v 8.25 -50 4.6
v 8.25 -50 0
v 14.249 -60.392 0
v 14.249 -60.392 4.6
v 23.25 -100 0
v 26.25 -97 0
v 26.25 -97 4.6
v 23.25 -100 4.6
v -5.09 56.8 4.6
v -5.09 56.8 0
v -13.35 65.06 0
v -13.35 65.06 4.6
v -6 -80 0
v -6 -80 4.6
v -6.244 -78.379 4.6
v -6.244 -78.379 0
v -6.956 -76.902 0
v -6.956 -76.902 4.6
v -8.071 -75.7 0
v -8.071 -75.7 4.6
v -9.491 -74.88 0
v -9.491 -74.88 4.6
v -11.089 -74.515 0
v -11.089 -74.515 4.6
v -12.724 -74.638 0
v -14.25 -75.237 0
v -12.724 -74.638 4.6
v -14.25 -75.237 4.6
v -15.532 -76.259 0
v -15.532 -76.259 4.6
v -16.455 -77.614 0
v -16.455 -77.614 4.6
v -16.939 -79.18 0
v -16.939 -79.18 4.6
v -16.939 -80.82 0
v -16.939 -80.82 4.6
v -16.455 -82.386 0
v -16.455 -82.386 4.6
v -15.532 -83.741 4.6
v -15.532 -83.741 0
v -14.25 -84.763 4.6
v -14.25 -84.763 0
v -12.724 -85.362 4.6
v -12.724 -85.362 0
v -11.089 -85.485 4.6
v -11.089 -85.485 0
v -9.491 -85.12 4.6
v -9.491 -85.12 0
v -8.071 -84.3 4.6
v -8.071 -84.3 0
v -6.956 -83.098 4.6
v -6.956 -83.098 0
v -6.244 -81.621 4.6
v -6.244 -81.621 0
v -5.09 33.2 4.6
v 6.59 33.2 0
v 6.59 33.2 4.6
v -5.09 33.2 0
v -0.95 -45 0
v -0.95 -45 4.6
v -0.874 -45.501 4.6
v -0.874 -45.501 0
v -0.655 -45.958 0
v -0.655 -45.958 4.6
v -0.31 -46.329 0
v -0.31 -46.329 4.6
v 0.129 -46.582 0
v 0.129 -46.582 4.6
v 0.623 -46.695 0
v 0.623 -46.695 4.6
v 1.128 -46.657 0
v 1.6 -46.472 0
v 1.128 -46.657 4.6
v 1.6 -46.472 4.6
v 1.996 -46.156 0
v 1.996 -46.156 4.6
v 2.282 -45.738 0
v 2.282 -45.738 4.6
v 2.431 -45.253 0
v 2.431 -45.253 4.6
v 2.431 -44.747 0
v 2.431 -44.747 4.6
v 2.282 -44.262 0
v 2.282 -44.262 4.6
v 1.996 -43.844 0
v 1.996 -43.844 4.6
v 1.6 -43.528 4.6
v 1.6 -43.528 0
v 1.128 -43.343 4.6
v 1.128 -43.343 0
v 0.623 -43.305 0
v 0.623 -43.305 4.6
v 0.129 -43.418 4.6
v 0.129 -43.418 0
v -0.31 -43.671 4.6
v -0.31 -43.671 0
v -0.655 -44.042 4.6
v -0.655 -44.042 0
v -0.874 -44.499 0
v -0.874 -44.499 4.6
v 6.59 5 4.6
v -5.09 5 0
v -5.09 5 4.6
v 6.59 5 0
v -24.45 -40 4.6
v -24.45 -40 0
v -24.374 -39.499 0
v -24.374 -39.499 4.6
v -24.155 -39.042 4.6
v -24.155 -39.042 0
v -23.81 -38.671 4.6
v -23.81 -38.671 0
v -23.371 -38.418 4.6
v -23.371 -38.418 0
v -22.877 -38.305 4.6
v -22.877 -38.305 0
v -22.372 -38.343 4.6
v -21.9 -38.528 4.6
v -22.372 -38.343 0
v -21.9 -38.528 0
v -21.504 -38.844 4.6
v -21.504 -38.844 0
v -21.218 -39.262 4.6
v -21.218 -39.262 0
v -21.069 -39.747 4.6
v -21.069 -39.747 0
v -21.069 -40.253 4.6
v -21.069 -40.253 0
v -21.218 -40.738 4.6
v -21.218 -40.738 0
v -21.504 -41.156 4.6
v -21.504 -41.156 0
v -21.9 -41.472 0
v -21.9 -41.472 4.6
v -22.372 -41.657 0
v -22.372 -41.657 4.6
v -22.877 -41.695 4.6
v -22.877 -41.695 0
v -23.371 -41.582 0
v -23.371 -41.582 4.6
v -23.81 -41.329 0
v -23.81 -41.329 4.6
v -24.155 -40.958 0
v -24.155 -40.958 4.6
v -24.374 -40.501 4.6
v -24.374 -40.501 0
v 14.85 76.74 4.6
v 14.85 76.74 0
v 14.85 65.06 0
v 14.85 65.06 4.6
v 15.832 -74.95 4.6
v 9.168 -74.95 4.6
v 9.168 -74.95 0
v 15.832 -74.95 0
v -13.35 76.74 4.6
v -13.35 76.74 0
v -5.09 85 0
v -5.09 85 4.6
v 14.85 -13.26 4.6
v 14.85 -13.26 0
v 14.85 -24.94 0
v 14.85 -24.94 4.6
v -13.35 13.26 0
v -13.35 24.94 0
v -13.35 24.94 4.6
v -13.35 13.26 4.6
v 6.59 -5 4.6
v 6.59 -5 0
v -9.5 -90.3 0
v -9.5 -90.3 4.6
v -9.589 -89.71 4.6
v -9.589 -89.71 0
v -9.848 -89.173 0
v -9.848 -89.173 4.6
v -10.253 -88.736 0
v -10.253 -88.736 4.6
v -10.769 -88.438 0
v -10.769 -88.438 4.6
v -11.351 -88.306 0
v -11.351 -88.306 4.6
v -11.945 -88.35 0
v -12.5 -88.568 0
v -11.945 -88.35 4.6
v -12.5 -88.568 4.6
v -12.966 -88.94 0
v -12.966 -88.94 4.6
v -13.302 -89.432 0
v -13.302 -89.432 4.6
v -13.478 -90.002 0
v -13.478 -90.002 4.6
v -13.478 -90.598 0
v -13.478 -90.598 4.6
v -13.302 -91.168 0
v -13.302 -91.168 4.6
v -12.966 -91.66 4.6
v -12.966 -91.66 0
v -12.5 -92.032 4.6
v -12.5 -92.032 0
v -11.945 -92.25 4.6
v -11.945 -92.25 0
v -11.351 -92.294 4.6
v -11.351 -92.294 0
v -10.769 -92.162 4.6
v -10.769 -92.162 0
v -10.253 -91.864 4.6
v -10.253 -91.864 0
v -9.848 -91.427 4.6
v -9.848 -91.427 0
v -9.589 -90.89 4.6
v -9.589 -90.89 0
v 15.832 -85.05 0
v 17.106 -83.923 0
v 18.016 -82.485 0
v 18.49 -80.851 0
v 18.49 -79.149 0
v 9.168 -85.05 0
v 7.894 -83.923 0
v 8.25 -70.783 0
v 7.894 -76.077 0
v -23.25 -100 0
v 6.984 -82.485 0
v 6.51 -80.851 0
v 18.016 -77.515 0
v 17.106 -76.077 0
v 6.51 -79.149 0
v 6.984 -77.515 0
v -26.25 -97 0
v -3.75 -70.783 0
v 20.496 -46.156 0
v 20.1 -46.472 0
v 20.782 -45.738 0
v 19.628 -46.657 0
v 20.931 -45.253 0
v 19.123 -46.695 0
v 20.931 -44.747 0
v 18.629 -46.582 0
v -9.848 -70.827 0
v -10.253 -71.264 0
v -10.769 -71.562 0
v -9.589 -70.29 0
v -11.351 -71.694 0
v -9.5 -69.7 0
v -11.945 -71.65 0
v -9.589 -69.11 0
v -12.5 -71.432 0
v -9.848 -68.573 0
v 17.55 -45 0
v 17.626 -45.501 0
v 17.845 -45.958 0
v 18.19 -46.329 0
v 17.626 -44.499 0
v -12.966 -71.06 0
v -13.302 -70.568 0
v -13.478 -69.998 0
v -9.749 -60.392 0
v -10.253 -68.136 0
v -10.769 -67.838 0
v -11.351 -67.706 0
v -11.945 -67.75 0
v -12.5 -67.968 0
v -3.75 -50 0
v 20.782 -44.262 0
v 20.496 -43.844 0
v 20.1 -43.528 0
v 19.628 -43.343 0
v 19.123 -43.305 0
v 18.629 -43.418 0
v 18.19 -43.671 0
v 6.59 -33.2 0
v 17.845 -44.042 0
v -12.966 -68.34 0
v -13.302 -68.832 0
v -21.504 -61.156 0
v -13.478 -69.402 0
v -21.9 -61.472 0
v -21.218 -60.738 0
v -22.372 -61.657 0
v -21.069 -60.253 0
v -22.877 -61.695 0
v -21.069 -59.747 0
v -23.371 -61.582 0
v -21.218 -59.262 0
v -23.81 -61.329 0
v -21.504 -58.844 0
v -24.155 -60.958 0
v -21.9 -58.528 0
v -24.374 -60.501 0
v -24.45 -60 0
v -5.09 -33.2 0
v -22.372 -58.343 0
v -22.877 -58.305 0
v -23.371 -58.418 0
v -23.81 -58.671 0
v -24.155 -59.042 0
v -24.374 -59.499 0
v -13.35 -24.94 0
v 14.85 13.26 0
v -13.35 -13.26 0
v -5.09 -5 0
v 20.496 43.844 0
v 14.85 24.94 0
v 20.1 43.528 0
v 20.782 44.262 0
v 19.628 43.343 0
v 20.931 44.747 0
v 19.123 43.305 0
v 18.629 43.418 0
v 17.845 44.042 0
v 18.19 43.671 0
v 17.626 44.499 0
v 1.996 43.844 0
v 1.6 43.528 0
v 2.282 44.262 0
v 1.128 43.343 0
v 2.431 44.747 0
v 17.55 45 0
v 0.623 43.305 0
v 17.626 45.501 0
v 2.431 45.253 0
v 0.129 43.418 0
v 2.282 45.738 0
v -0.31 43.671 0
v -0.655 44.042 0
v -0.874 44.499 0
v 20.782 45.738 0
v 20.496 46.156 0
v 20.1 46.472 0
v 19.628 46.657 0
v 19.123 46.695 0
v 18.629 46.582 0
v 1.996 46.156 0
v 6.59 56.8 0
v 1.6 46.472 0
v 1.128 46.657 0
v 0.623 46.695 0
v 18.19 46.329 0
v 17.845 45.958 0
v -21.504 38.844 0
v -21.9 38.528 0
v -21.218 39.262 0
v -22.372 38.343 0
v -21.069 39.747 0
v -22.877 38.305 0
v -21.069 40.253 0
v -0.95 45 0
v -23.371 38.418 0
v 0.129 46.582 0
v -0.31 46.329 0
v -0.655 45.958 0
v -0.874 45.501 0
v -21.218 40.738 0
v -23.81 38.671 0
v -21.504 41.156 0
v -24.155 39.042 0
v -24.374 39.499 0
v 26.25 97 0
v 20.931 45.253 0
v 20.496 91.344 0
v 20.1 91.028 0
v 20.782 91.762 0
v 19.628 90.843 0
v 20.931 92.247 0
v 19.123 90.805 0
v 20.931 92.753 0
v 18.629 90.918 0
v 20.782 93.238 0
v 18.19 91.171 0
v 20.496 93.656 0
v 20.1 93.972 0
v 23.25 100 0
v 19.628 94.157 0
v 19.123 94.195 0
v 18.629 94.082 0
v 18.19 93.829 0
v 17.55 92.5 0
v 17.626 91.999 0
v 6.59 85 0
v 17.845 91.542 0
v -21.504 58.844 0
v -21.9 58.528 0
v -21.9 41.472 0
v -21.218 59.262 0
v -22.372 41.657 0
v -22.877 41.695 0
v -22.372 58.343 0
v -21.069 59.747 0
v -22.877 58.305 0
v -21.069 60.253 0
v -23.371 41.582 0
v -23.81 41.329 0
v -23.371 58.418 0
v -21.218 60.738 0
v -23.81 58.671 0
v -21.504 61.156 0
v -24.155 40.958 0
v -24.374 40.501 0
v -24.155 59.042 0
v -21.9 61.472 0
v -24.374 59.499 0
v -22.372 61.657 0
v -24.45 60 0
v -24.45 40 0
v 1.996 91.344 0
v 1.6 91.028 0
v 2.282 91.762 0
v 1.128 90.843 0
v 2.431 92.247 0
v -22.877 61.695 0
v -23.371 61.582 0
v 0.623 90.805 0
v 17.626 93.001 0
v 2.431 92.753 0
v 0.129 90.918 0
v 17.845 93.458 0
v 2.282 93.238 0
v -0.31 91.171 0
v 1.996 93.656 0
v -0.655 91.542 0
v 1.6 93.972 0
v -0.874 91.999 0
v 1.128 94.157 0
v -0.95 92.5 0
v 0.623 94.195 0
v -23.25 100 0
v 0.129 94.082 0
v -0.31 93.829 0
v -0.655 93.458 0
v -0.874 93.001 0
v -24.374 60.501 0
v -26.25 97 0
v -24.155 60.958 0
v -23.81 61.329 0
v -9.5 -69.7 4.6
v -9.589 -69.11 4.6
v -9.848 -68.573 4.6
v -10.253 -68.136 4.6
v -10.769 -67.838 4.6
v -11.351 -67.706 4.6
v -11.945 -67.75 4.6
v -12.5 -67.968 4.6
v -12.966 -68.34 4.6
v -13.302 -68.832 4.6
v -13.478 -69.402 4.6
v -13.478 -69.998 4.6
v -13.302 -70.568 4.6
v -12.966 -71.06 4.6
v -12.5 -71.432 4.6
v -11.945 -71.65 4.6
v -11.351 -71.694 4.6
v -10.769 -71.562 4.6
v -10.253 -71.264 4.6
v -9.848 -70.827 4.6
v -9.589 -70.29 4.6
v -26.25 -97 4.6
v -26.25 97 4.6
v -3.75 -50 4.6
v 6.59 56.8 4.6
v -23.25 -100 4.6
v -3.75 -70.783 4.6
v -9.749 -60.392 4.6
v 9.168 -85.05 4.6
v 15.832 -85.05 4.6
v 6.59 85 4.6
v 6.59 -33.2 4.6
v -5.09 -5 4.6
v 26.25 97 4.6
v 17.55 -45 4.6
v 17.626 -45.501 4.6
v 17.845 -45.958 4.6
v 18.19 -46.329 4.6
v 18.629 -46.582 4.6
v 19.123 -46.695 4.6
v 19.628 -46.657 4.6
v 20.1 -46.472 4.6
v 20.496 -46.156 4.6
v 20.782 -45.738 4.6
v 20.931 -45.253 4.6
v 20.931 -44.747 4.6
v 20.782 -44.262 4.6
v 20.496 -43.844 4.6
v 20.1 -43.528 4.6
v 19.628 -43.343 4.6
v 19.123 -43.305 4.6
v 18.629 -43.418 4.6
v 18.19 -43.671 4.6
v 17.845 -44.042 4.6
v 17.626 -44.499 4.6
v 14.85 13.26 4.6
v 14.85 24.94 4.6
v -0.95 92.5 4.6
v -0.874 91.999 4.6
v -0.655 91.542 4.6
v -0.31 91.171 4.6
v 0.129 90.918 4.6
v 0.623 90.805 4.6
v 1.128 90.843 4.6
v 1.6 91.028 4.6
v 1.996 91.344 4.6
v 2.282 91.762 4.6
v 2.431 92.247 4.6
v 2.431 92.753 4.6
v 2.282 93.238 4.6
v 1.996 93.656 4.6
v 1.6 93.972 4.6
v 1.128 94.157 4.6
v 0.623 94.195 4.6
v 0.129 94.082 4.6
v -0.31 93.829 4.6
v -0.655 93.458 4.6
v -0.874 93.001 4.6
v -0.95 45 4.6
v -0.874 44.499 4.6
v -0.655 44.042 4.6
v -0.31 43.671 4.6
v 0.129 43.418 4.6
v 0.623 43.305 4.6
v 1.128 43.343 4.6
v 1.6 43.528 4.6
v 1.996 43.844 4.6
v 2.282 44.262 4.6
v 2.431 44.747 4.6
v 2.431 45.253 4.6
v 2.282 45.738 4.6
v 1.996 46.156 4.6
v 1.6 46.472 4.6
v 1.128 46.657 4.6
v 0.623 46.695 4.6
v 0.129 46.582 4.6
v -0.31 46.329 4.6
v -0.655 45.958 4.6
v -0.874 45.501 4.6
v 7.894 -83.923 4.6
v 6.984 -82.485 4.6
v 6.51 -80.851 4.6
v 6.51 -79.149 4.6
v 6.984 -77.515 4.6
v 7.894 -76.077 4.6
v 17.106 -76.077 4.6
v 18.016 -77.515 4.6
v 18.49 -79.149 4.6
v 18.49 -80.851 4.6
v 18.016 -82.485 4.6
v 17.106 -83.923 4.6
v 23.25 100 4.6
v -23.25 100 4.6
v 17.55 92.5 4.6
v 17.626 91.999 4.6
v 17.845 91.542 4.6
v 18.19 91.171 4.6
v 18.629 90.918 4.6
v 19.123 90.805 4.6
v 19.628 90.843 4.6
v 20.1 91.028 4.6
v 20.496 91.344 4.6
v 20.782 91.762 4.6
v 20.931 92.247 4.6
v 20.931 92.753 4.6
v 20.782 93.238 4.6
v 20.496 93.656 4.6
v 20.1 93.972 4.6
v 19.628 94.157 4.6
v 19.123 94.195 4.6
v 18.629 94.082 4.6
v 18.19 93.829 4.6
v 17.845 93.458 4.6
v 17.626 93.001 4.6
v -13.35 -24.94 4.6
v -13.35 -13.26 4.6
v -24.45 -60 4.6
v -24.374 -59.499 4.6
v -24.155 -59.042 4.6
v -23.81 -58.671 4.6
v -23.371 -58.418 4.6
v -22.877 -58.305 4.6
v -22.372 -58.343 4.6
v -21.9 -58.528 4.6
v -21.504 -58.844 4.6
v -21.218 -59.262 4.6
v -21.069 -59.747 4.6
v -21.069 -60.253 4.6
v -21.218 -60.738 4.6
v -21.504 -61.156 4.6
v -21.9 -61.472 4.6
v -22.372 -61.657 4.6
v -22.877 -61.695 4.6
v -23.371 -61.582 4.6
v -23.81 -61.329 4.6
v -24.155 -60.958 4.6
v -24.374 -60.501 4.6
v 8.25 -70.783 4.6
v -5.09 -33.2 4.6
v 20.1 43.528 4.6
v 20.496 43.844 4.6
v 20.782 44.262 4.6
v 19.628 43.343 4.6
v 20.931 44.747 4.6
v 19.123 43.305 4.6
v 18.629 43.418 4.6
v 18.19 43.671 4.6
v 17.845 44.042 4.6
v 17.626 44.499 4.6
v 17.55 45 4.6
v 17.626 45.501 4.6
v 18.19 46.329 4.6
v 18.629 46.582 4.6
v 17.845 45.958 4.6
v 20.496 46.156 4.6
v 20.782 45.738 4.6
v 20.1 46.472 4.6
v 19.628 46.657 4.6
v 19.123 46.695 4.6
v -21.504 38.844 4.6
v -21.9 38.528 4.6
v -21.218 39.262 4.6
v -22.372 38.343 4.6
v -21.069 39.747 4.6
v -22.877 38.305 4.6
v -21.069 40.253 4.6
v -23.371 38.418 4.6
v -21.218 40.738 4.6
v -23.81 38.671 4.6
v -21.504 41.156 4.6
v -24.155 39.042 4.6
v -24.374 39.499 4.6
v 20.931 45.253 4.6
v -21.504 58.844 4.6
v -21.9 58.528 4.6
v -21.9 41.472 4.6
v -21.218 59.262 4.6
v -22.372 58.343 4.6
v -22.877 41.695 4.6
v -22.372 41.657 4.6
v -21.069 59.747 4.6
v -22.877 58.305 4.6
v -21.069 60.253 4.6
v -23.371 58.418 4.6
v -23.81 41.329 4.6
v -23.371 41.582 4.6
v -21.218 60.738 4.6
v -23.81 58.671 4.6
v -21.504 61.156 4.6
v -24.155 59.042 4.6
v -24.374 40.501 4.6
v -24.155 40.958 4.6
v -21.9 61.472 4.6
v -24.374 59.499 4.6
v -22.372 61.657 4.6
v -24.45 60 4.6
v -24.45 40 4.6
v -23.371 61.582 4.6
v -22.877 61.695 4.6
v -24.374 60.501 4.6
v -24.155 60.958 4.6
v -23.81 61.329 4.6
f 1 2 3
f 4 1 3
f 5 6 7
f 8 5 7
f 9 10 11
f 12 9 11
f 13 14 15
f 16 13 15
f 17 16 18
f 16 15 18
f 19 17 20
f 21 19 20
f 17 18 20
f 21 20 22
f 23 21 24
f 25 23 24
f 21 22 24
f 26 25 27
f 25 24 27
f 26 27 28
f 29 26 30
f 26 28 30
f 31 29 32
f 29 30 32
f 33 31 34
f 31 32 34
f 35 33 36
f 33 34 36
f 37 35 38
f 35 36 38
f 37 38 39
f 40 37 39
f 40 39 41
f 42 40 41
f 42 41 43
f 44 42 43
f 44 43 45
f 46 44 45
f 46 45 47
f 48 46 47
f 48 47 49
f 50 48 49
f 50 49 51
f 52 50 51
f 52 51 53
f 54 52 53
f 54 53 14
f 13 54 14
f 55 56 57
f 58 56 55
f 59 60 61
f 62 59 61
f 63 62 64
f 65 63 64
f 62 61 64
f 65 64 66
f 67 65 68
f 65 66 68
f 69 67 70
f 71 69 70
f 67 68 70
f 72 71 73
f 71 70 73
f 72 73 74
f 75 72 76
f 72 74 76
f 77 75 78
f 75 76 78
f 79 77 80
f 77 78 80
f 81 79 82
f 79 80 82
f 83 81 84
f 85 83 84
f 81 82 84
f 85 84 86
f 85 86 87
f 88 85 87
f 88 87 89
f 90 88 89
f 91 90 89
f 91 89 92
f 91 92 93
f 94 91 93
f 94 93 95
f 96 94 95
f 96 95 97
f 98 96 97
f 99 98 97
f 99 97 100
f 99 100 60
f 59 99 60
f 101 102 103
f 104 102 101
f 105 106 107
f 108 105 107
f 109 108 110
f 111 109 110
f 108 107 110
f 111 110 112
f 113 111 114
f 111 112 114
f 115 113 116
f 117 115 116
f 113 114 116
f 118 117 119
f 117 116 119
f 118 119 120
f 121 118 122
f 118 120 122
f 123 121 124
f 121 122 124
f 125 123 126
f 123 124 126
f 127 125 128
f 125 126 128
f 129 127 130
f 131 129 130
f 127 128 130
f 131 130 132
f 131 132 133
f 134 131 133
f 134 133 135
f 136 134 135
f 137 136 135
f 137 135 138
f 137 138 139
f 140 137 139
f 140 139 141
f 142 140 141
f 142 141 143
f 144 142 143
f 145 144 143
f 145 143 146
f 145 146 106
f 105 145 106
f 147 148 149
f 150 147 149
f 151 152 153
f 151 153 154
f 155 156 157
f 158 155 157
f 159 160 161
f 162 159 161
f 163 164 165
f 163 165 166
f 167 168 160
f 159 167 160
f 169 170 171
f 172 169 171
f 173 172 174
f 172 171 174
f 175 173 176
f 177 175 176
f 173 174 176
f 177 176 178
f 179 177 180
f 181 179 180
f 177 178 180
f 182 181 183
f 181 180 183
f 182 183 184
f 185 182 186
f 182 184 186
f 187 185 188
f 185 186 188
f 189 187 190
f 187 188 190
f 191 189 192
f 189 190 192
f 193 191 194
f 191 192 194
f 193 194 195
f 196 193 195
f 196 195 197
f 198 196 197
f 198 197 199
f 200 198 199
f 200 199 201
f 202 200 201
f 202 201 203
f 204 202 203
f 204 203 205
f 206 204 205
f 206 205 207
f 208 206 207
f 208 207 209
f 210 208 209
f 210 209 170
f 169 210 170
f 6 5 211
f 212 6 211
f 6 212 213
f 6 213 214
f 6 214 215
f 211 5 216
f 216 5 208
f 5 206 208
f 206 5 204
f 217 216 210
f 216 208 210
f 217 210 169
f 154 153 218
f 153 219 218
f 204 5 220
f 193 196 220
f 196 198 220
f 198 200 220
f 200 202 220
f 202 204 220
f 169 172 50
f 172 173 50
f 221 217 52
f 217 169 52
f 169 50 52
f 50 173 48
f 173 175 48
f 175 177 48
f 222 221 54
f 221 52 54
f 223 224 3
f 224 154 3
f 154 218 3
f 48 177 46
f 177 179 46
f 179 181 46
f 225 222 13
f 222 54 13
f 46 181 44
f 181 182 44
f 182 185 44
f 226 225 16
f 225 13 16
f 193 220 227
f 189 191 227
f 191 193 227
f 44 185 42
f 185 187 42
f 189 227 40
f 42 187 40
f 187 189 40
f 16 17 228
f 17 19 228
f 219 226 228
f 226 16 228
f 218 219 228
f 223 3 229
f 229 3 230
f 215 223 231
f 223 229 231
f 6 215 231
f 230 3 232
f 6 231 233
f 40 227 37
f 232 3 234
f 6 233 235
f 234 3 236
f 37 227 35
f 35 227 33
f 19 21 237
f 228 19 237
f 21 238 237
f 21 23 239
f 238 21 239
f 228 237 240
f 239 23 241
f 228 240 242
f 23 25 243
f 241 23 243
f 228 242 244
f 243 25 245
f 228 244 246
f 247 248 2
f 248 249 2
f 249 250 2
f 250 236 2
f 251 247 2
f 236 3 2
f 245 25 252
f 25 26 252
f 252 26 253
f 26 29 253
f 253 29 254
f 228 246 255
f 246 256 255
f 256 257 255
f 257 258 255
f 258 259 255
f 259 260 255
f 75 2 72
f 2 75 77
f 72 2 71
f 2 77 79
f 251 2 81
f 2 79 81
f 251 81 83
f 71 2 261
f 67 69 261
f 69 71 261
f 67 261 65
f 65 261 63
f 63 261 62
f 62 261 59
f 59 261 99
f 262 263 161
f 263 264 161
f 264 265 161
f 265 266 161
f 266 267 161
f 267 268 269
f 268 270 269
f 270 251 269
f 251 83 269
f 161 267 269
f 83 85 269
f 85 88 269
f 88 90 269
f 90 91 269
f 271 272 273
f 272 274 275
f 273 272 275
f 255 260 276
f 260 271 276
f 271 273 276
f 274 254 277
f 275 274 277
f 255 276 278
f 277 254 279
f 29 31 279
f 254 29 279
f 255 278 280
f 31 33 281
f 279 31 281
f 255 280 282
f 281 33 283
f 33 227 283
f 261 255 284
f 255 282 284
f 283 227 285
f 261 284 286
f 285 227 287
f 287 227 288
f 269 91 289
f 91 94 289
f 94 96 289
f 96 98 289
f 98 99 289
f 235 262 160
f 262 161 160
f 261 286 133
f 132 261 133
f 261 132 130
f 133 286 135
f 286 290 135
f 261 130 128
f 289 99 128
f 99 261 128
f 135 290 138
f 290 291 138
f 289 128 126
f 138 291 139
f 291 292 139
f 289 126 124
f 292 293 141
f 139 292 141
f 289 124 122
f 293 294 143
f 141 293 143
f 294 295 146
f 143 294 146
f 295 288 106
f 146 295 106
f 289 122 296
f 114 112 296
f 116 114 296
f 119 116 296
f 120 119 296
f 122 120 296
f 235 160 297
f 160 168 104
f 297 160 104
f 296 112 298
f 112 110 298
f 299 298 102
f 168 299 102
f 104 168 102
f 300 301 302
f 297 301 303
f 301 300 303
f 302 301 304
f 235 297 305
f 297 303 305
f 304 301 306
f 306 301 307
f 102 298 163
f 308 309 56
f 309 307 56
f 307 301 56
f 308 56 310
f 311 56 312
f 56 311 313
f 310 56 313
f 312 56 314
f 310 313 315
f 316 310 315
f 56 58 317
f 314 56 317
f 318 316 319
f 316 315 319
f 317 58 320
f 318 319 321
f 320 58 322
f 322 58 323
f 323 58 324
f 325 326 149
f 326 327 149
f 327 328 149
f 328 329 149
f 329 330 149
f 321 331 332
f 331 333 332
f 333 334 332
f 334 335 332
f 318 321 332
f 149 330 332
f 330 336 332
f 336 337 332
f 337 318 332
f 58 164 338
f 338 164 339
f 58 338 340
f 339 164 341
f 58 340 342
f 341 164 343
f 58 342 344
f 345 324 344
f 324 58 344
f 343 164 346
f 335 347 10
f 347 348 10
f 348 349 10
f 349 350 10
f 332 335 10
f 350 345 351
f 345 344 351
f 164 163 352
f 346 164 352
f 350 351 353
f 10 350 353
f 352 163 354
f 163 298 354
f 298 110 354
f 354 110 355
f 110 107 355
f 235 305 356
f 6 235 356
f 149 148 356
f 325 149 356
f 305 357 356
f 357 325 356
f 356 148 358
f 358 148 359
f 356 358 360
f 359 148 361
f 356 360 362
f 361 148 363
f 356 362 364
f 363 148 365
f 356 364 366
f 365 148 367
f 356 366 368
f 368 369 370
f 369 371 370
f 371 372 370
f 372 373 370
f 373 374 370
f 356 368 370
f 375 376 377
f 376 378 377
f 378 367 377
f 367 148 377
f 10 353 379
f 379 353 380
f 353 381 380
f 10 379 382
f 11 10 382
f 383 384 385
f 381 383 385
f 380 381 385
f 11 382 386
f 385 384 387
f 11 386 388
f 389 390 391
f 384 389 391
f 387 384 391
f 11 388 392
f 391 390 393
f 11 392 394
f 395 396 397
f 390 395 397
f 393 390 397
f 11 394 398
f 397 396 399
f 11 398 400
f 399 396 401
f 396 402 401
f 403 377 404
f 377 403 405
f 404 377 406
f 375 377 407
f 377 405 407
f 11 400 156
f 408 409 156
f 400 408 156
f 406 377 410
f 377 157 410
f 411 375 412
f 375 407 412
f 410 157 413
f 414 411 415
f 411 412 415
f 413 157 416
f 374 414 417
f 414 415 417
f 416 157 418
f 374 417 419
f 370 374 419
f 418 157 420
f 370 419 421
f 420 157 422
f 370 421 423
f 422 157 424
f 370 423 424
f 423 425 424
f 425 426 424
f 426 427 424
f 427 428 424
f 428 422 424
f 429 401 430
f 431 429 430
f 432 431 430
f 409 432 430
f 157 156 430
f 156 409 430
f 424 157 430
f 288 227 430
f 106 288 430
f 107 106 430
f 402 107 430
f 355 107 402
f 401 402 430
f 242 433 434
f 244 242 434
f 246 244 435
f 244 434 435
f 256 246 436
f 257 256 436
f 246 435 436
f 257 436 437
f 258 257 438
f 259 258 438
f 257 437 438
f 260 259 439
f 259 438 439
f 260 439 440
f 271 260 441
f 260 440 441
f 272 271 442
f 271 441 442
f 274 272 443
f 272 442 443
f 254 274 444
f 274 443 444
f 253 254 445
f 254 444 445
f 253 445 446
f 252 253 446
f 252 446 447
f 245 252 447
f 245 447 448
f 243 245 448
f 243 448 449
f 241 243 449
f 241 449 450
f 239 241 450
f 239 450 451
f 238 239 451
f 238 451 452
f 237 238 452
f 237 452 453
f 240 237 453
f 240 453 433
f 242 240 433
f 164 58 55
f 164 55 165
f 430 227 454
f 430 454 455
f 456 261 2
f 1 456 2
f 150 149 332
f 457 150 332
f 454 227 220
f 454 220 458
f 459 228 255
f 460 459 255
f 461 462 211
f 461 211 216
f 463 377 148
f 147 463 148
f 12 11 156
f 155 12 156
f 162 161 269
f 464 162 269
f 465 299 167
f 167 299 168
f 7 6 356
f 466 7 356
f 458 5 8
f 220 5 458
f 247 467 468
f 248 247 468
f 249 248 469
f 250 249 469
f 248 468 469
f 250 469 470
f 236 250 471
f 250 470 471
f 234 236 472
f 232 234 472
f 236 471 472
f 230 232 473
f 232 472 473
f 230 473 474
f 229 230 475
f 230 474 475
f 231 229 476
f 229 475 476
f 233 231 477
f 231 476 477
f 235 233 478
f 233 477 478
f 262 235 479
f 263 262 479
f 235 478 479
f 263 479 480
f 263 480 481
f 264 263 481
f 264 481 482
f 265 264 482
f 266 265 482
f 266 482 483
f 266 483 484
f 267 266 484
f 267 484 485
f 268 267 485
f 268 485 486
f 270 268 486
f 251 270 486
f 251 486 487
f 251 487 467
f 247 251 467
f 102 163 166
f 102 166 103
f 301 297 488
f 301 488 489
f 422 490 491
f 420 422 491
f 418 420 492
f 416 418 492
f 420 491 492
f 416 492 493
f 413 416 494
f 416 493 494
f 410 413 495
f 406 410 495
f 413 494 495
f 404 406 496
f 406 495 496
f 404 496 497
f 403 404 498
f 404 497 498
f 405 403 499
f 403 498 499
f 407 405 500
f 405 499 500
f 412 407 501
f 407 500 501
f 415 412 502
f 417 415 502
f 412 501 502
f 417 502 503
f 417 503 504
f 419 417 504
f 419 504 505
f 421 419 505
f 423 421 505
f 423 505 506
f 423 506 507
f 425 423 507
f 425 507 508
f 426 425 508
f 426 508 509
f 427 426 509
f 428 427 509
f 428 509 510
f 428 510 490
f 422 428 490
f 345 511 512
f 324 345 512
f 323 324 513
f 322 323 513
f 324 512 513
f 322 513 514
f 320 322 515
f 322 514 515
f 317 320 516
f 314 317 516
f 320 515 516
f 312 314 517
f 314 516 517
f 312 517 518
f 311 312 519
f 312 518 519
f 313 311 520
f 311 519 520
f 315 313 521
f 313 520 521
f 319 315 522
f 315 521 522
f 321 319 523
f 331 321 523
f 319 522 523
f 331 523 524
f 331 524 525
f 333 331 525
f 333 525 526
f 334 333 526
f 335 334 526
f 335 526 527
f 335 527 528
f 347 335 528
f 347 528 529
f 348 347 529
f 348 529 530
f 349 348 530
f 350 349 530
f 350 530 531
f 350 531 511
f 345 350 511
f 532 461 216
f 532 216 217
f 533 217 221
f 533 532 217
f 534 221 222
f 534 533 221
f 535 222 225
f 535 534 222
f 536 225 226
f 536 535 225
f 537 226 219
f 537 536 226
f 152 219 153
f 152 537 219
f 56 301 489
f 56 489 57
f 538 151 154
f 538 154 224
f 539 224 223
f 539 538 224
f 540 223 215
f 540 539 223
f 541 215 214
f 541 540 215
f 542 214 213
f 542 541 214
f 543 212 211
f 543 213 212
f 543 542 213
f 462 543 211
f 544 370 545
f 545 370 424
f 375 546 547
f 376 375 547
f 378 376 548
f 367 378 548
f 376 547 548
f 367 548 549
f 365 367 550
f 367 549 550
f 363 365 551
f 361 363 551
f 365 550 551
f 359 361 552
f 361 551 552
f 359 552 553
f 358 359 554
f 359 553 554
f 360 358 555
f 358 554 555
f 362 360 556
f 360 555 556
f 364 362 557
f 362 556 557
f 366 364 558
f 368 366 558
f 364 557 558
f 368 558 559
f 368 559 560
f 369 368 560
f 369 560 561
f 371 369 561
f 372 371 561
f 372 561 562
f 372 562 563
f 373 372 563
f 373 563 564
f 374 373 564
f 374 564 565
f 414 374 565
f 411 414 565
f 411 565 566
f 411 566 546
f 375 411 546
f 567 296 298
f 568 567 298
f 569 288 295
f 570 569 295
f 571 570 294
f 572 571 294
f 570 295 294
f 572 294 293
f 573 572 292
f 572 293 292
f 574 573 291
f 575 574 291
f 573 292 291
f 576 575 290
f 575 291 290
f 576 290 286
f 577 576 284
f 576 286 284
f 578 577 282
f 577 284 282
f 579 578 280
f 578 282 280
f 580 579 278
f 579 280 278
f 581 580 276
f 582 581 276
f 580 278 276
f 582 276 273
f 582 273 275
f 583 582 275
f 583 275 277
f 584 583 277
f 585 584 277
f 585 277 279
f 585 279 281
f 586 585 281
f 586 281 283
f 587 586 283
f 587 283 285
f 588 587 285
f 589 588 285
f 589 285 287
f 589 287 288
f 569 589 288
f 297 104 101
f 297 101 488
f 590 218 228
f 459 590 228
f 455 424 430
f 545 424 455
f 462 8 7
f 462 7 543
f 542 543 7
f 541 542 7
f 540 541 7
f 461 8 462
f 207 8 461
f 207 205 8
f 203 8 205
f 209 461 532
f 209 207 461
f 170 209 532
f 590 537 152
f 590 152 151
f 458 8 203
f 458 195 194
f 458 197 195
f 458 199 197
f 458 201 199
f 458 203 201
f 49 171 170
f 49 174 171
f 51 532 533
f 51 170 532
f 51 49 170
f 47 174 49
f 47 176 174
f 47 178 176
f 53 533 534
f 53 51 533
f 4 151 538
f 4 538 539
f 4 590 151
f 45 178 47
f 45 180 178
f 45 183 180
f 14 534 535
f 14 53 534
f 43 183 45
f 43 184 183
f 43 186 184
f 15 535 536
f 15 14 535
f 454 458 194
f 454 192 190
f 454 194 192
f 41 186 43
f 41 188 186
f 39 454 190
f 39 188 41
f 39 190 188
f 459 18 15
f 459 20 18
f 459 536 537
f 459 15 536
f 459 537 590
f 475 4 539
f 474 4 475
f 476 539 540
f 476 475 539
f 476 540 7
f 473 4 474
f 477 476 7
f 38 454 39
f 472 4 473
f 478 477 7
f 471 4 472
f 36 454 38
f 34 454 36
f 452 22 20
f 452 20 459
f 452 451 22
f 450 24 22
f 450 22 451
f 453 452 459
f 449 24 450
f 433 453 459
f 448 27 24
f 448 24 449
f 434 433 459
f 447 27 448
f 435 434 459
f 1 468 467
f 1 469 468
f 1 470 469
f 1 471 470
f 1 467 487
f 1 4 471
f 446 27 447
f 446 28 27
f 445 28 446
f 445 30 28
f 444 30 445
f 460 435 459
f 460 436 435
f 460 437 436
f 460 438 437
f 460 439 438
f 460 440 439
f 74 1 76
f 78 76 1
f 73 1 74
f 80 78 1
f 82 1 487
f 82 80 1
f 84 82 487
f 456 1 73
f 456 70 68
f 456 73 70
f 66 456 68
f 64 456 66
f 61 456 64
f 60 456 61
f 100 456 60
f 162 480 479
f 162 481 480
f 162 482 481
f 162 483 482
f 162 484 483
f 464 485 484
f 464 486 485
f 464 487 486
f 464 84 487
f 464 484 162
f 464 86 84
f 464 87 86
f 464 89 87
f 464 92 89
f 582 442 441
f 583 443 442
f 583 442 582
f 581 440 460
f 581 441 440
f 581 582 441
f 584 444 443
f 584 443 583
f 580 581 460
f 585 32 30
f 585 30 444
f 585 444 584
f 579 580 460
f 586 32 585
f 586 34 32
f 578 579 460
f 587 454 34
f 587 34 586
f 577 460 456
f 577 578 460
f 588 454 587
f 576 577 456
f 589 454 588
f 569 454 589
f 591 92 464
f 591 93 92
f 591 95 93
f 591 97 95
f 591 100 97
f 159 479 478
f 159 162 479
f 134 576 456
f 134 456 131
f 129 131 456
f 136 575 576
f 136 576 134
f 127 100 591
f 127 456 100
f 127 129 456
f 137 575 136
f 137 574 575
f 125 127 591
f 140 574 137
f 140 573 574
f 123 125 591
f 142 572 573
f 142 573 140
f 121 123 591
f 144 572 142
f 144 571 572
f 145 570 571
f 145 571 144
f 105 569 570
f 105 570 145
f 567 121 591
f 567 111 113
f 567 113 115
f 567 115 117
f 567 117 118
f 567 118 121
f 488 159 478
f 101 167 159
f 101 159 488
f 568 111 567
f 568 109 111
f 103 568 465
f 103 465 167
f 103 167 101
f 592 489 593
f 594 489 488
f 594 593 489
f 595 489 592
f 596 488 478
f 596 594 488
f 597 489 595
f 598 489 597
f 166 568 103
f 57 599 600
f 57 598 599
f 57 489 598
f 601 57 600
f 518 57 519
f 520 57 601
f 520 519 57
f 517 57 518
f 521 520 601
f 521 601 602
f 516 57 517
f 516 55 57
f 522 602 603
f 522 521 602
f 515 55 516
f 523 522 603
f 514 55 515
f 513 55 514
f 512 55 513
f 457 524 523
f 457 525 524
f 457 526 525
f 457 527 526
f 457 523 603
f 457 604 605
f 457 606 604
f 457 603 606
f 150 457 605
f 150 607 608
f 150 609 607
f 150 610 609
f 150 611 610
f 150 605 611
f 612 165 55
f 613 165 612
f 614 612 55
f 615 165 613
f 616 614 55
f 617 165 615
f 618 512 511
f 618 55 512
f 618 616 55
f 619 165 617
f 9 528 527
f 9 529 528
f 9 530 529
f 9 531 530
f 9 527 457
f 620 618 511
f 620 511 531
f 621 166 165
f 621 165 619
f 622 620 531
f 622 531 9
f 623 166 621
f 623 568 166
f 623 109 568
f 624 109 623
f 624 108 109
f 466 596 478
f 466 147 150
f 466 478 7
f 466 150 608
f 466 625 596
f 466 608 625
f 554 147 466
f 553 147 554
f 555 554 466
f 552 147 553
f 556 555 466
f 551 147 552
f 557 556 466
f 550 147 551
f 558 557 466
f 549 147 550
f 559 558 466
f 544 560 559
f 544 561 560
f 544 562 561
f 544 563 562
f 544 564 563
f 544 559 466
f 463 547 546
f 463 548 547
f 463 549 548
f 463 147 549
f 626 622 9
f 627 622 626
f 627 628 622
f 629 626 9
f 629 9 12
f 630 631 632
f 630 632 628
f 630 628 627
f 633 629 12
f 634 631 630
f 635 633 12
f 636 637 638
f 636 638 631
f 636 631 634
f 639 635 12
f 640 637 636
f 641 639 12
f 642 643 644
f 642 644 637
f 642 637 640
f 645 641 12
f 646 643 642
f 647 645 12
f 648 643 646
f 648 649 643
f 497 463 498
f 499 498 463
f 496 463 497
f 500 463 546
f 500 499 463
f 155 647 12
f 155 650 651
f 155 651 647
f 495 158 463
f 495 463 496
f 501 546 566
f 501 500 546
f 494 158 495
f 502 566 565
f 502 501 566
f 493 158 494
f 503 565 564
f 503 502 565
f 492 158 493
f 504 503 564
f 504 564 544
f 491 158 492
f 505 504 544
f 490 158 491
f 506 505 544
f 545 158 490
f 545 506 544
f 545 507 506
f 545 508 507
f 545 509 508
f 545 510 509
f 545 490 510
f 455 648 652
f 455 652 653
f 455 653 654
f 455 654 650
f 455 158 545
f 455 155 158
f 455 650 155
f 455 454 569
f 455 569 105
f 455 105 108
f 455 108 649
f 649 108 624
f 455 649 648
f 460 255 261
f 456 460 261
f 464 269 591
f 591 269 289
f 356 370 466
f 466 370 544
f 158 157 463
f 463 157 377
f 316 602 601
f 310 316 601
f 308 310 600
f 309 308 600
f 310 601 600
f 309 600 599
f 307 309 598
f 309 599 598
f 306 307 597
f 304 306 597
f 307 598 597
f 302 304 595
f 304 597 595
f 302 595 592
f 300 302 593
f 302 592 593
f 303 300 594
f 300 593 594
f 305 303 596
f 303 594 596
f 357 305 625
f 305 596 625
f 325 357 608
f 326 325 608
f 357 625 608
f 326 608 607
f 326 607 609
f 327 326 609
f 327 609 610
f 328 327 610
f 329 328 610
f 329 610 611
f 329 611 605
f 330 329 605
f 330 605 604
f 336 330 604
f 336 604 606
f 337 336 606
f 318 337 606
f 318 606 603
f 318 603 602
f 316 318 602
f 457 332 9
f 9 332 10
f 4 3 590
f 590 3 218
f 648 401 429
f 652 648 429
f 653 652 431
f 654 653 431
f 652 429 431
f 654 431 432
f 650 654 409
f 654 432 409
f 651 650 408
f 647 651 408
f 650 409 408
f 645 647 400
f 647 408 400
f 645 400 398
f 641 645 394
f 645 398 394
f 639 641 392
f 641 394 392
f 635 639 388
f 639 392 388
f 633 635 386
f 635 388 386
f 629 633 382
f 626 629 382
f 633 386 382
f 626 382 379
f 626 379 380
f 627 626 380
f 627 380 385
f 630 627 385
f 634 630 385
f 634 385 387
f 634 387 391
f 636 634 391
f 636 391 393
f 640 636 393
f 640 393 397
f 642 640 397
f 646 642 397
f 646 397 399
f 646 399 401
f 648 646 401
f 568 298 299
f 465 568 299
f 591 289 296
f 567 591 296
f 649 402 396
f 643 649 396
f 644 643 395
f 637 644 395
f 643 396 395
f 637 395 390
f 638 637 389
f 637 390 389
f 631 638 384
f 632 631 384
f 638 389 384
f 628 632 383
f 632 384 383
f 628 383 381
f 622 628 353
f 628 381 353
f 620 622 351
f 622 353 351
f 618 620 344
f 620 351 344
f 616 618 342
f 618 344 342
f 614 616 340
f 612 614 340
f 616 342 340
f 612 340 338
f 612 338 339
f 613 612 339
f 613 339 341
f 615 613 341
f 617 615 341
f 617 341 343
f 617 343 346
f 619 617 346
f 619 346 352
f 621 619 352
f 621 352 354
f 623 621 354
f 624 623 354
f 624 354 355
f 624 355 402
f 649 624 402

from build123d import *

# Parameters (mm, degrees)
CROQUIS1_W                   = 200
CROQUIS1_H                   = 52.5
SALIENTE_EXTRUIR1_DEPTH      = 4.6
CORTAR_EXTRUIR1_REACH        = 105.49
CORTAR_EXTRUIR2_REACH        = 105.49
CROQUIS3_R                   = 5.5
CROQUIS3_R_2                 = 2
TALADRO_DE_MARGEN_PARA_M31_D = 3.4
CHAFL_N1_SIZE                = 3
TALADRO_DE_MARGEN_PARA_M32_D = 3.4
CORTAR_EXTRUIR3_DEPTH        = 10


with BuildPart() as part:
    # Croquis1 → Saliente-Extruir1 (new body)
    with BuildSketch(Plane(origin=(0, 0, 0), x_dir=(0, 1, 0), z_dir=(0, 0, 1))):
        Rectangle(CROQUIS1_W, CROQUIS1_H)
    extrude(amount=SALIENTE_EXTRUIR1_DEPTH)

    # Croquis2 → Cortar-Extruir1 (cut, up to next)
    with BuildSketch(Plane.XY.offset(4.6), mode=Mode.PRIVATE) as cortar_extruir1_sk1:
        with BuildLine():
            Line((9.16833375, -74.95), (15.83166625, -74.95))
            ThreePointArc((15.83166625, -74.95), (18.55, -80), (15.83166625, -85.05))
            Line((15.83166625, -85.05), (9.16833375, -85.05))
            ThreePointArc((9.16833375, -85.05), (6.45, -80), (9.16833375, -74.95))
        make_face()
    cortar_extruir1_tool1 = extrude(cortar_extruir1_sk1.sketch, amount=-CORTAR_EXTRUIR1_REACH, mode=Mode.PRIVATE) & part.part
    add(cortar_extruir1_tool1.solids().sort_by_distance((12.5, -80, 4.6))[0], mode=Mode.SUBTRACT)

    # Croquis3 → Cortar-Extruir2 (cut, up to next)
    with BuildSketch(Plane.XY.offset(4.6), mode=Mode.PRIVATE) as cortar_extruir2_sk1:
        with Locations((-11.5, -80)):
            Circle(CROQUIS3_R)
    cortar_extruir2_tool1 = extrude(cortar_extruir2_sk1.sketch, amount=-CORTAR_EXTRUIR2_REACH, mode=Mode.PRIVATE) & part.part
    # Croquis3 → Cortar-Extruir2 (cut, up to next)
    with BuildSketch(Plane.XY.offset(4.6), mode=Mode.PRIVATE) as cortar_extruir2_sk2:
        with Locations((-11.5, -90.3)):
            Circle(CROQUIS3_R_2)
    cortar_extruir2_tool2 = extrude(cortar_extruir2_sk2.sketch, amount=-CORTAR_EXTRUIR2_REACH, mode=Mode.PRIVATE) & part.part
    # Croquis3 → Cortar-Extruir2 (cut, up to next)
    with BuildSketch(Plane.XY.offset(4.6), mode=Mode.PRIVATE) as cortar_extruir2_sk3:
        with Locations((-11.5, -69.7)):
            Circle(CROQUIS3_R_2)
    cortar_extruir2_tool3 = extrude(cortar_extruir2_sk3.sketch, amount=-CORTAR_EXTRUIR2_REACH, mode=Mode.PRIVATE) & part.part
    add(cortar_extruir2_tool1.solids().sort_by_distance((-11.5, -80, 4.6))[0], mode=Mode.SUBTRACT)
    add(cortar_extruir2_tool2.solids().sort_by_distance((-11.5, -90.3, 4.6))[0], mode=Mode.SUBTRACT)
    add(cortar_extruir2_tool3.solids().sort_by_distance((-11.5, -69.7, 4.6))[0], mode=Mode.SUBTRACT)

    # Taladro de margen para M31 (through all)
    with Locations(Plane(origin=(0, 0, 0), x_dir=(1, 0, 0), z_dir=(0, 0, -1))):
        with Locations((19.25, -45), (19.25, 45), (0.75, 45), (0.75, -45), (19.25, -92.5), (0.75, -92.5)):
            Hole(TALADRO_DE_MARGEN_PARA_M31_D / 2)

    # Chafl_n1
    chafl_n1_edges = [part.edges().sort_by_distance(p)[0] for p in [
        (26.25, 100, 2.3),
        (26.25, -100, 2.3),
        (-26.25, -100, 2.3),
        (-26.25, 100, 2.3),
    ]]
    chamfer(chafl_n1_edges, length=CHAFL_N1_SIZE)

    # Taladro de margen para M32 (through all)
    with Locations(Plane.XY.offset(4.6)):
        with Locations((-22.75, -60), (-22.75, -40), (-22.75, 40), (-22.75, 60)):
            Hole(TALADRO_DE_MARGEN_PARA_M32_D / 2)

    # Croquis8 → Cortar-Extruir3 (cut)
    with BuildSketch(Plane(origin=(0, 0, 0), x_dir=(1, 0, 0), z_dir=(0, 0, -1))):
        Polygon((-5.090411229, 33.2), (-13.35, 24.940411229), (-13.35, 13.259588771), (-5.090411229, 5), (6.590411229, 5), (14.85, 13.259588771), (14.85, 24.940411229), (6.590411229, 33.2), align=None)
        Polygon((6.590411229, -33.2), (-5.090411229, -33.2), (-13.35, -24.940411229), (-13.35, -13.259588771), (-5.090411229, -5), (6.590411229, -5), (14.85, -13.259588771), (14.85, -24.940411229), align=None)
        Polygon((-5.090411229, -56.8), (-13.35, -65.059588771), (-13.35, -76.740411229), (-5.090411229, -85), (6.590411229, -85), (14.85, -76.740411229), (14.85, -65.059588771), (6.590411229, -56.8), align=None)
        Polygon((-3.749578543, 50), (8.249578543, 50), (14.249157087, 60.391574861), (8.249578543, 70.783149723), (-3.749578543, 70.783149723), (-9.749157087, 60.391574861), align=None)
    extrude(amount=-CORTAR_EXTRUIR3_DEPTH, mode=Mode.SUBTRACT)


solid = part.part
